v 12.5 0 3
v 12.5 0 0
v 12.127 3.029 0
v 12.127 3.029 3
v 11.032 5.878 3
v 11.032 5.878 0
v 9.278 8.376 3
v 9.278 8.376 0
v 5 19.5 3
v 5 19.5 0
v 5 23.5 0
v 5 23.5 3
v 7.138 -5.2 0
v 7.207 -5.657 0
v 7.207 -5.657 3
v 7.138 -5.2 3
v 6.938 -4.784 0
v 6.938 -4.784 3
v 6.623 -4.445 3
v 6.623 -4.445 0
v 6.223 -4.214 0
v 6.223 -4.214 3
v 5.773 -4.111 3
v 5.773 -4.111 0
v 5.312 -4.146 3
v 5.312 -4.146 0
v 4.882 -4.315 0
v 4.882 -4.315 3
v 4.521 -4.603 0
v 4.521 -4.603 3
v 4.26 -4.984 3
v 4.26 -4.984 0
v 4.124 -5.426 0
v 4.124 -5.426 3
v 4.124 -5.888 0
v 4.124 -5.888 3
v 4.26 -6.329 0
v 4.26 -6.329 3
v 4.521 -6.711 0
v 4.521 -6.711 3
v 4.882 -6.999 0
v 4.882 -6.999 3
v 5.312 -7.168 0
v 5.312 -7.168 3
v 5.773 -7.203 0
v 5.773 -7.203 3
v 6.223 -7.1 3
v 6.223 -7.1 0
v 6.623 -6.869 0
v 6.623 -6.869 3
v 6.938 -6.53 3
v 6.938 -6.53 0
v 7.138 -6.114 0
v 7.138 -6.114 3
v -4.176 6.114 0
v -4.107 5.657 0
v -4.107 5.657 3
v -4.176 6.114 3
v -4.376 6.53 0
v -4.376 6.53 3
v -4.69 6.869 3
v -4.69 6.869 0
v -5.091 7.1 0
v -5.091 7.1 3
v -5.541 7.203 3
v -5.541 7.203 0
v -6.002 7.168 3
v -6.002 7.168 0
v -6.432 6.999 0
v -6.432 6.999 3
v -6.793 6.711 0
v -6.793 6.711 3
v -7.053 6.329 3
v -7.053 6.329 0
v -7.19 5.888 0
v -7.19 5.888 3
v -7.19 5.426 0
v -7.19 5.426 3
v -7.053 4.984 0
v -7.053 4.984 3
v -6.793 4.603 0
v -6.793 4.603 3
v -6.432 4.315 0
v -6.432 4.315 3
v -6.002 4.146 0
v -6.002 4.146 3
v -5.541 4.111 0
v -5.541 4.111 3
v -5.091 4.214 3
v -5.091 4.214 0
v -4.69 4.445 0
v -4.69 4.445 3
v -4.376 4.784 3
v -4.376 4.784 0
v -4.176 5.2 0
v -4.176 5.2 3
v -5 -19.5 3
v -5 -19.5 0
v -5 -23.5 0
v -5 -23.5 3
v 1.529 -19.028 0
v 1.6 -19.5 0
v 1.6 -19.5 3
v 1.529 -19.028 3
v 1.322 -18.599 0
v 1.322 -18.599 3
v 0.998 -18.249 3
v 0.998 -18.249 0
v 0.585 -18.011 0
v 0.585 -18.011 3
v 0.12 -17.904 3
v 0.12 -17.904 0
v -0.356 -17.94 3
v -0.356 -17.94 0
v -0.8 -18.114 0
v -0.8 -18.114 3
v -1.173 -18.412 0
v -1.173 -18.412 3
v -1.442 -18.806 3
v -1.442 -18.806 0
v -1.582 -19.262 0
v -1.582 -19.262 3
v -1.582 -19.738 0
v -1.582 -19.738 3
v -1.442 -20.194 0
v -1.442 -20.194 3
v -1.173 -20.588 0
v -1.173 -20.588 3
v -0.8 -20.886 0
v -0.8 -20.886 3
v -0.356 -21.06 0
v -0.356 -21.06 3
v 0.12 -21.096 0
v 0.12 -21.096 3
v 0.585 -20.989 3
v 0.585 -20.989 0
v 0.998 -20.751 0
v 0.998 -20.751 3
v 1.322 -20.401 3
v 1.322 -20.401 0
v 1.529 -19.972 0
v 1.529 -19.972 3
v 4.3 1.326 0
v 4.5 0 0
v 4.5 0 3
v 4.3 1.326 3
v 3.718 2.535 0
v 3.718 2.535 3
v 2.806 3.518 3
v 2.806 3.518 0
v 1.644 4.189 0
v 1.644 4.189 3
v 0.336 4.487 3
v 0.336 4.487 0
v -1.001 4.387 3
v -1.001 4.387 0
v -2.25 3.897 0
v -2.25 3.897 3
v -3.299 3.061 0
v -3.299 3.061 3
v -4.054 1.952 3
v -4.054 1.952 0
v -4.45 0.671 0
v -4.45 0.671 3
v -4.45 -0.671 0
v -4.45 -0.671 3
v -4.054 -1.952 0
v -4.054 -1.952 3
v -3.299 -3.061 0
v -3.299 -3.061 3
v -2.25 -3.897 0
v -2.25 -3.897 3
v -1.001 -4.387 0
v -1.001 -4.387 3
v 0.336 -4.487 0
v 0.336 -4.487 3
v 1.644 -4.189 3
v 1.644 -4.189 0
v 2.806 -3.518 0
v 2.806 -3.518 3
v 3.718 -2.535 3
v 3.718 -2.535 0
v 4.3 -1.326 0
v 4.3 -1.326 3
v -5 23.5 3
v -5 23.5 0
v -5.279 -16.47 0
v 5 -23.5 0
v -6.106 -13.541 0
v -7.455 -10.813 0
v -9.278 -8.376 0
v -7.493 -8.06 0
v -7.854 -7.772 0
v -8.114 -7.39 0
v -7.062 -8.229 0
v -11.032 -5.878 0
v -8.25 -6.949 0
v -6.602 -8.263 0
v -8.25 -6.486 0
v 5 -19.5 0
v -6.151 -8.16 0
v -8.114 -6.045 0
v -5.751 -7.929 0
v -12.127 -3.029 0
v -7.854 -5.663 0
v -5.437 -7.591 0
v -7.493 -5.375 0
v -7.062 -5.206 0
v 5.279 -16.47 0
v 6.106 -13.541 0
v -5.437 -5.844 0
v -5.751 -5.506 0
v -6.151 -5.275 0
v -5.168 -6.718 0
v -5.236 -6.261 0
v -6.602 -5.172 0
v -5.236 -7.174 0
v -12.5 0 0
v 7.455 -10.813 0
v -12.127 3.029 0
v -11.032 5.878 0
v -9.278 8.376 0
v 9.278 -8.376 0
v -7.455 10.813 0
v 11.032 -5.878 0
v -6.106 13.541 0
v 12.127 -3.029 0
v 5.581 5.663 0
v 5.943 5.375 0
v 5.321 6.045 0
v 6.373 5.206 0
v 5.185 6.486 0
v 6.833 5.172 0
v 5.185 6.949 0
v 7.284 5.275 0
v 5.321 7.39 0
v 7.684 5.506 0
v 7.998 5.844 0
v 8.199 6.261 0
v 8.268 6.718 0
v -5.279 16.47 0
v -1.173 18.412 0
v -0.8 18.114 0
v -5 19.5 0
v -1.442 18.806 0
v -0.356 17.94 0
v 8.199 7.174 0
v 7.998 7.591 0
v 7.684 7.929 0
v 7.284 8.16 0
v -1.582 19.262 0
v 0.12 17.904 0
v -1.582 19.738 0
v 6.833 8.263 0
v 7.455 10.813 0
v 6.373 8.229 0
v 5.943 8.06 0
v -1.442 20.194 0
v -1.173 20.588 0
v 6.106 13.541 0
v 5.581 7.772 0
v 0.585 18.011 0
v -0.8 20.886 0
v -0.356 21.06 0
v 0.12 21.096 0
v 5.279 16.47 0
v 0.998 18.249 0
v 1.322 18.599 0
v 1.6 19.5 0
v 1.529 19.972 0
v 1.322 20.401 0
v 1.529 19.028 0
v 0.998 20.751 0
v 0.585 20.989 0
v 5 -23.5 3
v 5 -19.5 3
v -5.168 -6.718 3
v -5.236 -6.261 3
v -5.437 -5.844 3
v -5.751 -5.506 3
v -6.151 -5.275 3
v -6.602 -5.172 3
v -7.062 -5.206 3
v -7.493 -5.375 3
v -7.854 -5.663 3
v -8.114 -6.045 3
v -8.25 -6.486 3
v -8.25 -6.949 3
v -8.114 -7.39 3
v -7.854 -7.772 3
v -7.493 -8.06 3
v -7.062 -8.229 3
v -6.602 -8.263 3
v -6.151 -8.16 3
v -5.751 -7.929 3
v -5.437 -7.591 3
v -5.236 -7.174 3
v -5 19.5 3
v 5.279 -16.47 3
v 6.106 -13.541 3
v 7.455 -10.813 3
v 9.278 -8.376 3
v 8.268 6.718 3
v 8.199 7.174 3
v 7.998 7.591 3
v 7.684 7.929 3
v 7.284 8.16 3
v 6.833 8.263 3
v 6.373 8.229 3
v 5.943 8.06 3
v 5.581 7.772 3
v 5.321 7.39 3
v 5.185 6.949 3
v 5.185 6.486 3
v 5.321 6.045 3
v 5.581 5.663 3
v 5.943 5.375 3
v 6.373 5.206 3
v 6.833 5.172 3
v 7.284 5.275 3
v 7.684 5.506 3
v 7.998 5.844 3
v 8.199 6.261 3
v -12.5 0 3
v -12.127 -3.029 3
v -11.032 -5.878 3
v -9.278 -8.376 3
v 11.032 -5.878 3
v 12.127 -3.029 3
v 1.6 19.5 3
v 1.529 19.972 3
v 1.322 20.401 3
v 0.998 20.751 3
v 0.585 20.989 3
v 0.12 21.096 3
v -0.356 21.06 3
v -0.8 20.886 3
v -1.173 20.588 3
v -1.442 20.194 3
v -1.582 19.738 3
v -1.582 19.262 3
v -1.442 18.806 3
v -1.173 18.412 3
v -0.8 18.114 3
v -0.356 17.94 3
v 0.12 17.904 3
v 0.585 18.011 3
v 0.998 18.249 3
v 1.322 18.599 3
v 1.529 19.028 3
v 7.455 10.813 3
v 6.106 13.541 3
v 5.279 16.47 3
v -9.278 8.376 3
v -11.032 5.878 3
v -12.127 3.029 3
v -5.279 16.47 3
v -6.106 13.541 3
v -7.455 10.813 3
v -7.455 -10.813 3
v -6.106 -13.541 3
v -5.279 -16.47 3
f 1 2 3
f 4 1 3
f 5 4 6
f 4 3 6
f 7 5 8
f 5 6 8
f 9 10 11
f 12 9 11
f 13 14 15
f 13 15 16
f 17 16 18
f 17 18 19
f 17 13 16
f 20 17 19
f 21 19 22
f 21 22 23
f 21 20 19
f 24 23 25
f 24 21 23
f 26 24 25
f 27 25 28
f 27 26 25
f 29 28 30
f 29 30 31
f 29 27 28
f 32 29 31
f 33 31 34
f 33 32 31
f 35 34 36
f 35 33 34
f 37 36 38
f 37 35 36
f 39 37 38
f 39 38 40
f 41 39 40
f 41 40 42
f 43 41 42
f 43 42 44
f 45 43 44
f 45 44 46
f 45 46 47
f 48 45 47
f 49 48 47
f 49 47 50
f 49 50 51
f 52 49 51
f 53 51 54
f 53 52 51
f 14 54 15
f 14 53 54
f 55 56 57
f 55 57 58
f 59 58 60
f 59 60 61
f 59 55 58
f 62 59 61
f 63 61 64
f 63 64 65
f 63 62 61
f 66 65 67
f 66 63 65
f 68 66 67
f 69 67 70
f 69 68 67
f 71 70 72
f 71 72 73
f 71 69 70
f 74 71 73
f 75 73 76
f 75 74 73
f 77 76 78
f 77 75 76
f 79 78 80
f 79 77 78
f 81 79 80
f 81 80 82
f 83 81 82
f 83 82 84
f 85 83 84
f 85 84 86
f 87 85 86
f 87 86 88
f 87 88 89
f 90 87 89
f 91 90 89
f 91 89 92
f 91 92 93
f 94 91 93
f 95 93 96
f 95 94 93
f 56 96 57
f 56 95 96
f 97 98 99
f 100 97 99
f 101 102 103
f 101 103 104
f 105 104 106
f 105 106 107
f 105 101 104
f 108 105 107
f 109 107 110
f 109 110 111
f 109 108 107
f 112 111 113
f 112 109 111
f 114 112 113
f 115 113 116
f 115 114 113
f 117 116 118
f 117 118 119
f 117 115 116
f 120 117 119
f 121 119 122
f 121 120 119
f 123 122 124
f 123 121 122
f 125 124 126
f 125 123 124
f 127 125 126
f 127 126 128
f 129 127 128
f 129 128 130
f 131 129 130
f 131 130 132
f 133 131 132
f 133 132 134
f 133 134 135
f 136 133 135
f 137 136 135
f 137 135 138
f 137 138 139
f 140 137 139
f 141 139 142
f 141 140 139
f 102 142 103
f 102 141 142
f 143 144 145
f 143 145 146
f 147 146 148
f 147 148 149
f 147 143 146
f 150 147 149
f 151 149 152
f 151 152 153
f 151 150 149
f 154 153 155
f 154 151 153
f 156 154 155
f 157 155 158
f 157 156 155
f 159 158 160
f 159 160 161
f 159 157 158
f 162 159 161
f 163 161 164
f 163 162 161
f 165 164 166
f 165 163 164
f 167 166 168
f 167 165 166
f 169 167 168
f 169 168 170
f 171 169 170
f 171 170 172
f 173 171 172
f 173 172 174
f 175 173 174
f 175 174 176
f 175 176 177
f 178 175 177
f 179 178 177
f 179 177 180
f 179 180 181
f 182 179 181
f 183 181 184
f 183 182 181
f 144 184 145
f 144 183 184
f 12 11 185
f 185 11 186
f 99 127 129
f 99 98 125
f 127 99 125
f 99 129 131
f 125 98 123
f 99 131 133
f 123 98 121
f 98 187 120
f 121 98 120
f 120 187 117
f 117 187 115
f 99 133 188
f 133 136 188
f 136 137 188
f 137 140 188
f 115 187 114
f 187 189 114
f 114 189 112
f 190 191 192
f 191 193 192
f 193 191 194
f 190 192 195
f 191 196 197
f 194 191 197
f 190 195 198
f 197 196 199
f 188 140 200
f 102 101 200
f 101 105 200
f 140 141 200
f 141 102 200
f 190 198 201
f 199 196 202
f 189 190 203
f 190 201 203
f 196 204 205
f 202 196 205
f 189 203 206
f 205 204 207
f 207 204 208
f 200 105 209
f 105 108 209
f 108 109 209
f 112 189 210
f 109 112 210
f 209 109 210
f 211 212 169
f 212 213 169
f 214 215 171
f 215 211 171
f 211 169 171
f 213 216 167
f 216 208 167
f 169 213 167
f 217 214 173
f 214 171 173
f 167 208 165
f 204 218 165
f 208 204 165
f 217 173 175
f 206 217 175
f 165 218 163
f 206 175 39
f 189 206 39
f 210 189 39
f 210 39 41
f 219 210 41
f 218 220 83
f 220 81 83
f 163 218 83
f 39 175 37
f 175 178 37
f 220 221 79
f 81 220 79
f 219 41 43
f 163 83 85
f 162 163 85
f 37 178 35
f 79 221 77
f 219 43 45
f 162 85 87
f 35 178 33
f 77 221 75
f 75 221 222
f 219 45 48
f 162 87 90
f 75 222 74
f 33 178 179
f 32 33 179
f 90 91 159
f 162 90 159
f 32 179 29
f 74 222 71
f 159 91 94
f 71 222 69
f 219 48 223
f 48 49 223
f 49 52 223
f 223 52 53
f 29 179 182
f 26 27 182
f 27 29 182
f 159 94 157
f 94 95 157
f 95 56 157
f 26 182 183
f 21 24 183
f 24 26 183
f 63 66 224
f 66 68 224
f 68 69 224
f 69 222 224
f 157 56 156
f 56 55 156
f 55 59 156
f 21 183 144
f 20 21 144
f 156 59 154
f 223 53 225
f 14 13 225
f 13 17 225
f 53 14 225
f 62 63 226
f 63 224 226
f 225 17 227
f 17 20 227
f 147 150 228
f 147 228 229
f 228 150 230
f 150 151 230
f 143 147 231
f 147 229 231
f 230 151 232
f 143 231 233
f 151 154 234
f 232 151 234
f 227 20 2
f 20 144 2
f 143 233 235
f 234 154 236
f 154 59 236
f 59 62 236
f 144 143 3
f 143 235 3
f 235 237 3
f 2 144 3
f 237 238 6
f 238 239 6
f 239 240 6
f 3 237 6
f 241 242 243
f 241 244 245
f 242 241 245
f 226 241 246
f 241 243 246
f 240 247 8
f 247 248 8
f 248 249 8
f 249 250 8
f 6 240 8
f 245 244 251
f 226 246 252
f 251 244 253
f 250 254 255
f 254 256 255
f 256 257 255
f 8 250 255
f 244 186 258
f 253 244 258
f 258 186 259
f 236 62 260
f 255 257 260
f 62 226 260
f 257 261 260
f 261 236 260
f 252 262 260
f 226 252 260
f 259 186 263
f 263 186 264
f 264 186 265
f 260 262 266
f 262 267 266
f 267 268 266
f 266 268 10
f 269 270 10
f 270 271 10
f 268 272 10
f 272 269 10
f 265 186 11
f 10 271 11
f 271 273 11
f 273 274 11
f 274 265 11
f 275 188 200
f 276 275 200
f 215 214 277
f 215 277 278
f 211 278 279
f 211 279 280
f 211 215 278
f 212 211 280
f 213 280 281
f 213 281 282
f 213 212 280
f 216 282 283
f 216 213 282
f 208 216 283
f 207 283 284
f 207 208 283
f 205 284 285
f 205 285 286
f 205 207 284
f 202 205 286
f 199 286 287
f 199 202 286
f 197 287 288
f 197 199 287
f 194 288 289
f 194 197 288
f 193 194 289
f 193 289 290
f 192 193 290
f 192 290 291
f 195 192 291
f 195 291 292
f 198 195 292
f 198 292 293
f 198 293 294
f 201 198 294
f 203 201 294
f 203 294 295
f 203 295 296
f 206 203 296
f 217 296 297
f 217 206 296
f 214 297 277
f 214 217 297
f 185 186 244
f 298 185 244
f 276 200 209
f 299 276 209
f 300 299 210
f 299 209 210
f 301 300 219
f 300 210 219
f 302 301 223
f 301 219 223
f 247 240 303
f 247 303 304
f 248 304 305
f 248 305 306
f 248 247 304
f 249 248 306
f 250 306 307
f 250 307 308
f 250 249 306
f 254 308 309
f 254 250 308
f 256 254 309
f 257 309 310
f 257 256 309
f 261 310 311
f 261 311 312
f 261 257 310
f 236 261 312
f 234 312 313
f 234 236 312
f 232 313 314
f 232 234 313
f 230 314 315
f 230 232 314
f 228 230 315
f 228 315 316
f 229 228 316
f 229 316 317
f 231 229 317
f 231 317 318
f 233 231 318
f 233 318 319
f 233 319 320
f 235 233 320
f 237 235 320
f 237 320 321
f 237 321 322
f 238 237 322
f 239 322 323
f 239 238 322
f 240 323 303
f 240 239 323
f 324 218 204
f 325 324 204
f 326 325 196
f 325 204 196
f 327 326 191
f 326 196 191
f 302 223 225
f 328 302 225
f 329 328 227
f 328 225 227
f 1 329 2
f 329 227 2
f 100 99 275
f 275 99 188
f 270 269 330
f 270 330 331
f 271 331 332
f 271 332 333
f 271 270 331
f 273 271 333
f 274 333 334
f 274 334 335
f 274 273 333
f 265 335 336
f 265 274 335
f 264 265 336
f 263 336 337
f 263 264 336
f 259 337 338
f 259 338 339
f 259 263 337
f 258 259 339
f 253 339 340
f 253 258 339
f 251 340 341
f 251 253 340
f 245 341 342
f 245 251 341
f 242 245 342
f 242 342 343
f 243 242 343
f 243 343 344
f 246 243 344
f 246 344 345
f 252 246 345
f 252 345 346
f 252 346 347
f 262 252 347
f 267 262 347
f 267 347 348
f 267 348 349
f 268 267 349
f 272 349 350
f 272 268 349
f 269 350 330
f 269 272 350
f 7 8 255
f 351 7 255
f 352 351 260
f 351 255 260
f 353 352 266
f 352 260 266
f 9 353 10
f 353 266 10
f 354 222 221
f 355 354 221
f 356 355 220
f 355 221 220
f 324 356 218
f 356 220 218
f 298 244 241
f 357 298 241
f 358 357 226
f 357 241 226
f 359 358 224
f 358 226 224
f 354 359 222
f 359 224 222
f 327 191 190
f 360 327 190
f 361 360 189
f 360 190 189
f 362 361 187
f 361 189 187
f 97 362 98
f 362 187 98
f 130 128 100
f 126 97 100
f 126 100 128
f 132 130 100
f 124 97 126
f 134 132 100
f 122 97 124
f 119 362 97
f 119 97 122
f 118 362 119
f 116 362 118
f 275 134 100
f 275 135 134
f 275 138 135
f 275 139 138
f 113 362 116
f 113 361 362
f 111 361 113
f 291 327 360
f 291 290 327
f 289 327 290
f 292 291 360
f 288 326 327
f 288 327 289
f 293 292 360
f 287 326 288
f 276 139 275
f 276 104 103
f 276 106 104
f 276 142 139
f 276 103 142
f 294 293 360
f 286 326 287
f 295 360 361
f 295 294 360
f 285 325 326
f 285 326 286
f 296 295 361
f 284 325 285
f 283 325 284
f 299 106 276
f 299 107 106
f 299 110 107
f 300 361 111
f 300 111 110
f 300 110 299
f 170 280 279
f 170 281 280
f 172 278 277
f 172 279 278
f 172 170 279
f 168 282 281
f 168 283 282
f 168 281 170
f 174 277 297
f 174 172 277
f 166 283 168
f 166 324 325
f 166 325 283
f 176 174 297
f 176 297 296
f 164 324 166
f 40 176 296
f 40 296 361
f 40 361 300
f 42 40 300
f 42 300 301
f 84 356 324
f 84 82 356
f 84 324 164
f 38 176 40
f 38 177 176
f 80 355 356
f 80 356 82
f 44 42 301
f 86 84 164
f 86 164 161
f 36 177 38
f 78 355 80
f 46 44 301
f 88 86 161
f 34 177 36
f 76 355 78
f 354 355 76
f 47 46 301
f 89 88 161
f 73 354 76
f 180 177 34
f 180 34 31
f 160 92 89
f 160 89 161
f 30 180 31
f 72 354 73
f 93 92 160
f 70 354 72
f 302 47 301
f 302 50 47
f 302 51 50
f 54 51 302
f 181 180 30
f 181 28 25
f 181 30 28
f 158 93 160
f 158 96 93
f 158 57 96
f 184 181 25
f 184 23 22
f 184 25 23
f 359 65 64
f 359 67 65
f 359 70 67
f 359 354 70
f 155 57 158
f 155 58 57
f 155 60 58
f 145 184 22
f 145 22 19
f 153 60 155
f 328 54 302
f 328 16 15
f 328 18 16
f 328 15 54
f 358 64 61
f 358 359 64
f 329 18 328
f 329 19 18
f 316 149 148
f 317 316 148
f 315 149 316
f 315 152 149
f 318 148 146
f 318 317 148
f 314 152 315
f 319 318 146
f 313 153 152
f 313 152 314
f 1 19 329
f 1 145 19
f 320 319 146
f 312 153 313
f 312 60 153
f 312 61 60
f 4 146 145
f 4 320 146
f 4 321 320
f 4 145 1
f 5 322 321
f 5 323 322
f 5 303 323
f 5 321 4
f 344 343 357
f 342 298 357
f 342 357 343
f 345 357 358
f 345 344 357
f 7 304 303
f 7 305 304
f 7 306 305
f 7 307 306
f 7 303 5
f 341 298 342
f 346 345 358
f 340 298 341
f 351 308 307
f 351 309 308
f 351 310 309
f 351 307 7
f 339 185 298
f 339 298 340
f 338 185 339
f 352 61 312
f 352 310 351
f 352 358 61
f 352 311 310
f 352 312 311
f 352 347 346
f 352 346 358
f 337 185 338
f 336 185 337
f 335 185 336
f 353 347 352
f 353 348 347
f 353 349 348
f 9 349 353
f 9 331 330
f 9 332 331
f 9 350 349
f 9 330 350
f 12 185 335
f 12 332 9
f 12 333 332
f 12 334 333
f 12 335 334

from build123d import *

# Parameters (mm, degrees)
F0_R     = 1.55
F0_R_2   = 1.6
F0_R_3   = 4.5
F1_DEPTH = 3


with BuildPart() as f1:
    # F0 (on Top) → F1 (new body)
    with BuildSketch(Plane.XY):
        with BuildLine():
            ThreePointArc((-5, 19.5), (-6.106463, 13.540947), (-9.278351, 8.376289))
            ThreePointArc((-9.278351, 8.376289), (-11.66682, 4.487238), (-12.5, 0))
            ThreePointArc((-12.5, 0), (-11.66682, -4.487238), (-9.278351, -8.376289))
            ThreePointArc((-9.278351, -8.376289), (-6.106463, -13.540947), (-5, -19.5))
            Line((-5, -19.5), (-5, -23.5))
            Line((-5, -23.5), (5, -23.5))
            Line((5, -23.5), (5, -19.5))
            ThreePointArc((5, -19.5), (6.106463, -13.540947), (9.278351, -8.376289))
            ThreePointArc((9.278351, -8.376289), (11.66682, -4.487238), (12.5, 0))
            ThreePointArc((12.5, 0), (11.66682, 4.487238), (9.278351, 8.376289))
            ThreePointArc((9.278351, 8.376289), (6.106463, 13.540947), (5, 19.5))
            Line((5, 19.5), (5, 23.5))
            Line((5, 23.5), (-5, 23.5))
            Line((-5, 23.5), (-5, 19.5))
        make_face()
        with Locations((-6.717514, -6.717514)):
            Circle(F0_R, mode=Mode.SUBTRACT)
        with Locations((0, -19.5)):
            Circle(F0_R_2, mode=Mode.SUBTRACT)
        with Locations((5.656854, -5.656854)):
            Circle(F0_R, mode=Mode.SUBTRACT)
        with Locations((-5.656854, 5.656854)):
            Circle(F0_R, mode=Mode.SUBTRACT)
        Circle(F0_R_3, mode=Mode.SUBTRACT)
        with Locations((6.717514, 6.717514)):
            Circle(F0_R, mode=Mode.SUBTRACT)
        with Locations((0, 19.5)):
            Circle(F0_R_2, mode=Mode.SUBTRACT)
    extrude(amount=F1_DEPTH)


solid = f1.part
